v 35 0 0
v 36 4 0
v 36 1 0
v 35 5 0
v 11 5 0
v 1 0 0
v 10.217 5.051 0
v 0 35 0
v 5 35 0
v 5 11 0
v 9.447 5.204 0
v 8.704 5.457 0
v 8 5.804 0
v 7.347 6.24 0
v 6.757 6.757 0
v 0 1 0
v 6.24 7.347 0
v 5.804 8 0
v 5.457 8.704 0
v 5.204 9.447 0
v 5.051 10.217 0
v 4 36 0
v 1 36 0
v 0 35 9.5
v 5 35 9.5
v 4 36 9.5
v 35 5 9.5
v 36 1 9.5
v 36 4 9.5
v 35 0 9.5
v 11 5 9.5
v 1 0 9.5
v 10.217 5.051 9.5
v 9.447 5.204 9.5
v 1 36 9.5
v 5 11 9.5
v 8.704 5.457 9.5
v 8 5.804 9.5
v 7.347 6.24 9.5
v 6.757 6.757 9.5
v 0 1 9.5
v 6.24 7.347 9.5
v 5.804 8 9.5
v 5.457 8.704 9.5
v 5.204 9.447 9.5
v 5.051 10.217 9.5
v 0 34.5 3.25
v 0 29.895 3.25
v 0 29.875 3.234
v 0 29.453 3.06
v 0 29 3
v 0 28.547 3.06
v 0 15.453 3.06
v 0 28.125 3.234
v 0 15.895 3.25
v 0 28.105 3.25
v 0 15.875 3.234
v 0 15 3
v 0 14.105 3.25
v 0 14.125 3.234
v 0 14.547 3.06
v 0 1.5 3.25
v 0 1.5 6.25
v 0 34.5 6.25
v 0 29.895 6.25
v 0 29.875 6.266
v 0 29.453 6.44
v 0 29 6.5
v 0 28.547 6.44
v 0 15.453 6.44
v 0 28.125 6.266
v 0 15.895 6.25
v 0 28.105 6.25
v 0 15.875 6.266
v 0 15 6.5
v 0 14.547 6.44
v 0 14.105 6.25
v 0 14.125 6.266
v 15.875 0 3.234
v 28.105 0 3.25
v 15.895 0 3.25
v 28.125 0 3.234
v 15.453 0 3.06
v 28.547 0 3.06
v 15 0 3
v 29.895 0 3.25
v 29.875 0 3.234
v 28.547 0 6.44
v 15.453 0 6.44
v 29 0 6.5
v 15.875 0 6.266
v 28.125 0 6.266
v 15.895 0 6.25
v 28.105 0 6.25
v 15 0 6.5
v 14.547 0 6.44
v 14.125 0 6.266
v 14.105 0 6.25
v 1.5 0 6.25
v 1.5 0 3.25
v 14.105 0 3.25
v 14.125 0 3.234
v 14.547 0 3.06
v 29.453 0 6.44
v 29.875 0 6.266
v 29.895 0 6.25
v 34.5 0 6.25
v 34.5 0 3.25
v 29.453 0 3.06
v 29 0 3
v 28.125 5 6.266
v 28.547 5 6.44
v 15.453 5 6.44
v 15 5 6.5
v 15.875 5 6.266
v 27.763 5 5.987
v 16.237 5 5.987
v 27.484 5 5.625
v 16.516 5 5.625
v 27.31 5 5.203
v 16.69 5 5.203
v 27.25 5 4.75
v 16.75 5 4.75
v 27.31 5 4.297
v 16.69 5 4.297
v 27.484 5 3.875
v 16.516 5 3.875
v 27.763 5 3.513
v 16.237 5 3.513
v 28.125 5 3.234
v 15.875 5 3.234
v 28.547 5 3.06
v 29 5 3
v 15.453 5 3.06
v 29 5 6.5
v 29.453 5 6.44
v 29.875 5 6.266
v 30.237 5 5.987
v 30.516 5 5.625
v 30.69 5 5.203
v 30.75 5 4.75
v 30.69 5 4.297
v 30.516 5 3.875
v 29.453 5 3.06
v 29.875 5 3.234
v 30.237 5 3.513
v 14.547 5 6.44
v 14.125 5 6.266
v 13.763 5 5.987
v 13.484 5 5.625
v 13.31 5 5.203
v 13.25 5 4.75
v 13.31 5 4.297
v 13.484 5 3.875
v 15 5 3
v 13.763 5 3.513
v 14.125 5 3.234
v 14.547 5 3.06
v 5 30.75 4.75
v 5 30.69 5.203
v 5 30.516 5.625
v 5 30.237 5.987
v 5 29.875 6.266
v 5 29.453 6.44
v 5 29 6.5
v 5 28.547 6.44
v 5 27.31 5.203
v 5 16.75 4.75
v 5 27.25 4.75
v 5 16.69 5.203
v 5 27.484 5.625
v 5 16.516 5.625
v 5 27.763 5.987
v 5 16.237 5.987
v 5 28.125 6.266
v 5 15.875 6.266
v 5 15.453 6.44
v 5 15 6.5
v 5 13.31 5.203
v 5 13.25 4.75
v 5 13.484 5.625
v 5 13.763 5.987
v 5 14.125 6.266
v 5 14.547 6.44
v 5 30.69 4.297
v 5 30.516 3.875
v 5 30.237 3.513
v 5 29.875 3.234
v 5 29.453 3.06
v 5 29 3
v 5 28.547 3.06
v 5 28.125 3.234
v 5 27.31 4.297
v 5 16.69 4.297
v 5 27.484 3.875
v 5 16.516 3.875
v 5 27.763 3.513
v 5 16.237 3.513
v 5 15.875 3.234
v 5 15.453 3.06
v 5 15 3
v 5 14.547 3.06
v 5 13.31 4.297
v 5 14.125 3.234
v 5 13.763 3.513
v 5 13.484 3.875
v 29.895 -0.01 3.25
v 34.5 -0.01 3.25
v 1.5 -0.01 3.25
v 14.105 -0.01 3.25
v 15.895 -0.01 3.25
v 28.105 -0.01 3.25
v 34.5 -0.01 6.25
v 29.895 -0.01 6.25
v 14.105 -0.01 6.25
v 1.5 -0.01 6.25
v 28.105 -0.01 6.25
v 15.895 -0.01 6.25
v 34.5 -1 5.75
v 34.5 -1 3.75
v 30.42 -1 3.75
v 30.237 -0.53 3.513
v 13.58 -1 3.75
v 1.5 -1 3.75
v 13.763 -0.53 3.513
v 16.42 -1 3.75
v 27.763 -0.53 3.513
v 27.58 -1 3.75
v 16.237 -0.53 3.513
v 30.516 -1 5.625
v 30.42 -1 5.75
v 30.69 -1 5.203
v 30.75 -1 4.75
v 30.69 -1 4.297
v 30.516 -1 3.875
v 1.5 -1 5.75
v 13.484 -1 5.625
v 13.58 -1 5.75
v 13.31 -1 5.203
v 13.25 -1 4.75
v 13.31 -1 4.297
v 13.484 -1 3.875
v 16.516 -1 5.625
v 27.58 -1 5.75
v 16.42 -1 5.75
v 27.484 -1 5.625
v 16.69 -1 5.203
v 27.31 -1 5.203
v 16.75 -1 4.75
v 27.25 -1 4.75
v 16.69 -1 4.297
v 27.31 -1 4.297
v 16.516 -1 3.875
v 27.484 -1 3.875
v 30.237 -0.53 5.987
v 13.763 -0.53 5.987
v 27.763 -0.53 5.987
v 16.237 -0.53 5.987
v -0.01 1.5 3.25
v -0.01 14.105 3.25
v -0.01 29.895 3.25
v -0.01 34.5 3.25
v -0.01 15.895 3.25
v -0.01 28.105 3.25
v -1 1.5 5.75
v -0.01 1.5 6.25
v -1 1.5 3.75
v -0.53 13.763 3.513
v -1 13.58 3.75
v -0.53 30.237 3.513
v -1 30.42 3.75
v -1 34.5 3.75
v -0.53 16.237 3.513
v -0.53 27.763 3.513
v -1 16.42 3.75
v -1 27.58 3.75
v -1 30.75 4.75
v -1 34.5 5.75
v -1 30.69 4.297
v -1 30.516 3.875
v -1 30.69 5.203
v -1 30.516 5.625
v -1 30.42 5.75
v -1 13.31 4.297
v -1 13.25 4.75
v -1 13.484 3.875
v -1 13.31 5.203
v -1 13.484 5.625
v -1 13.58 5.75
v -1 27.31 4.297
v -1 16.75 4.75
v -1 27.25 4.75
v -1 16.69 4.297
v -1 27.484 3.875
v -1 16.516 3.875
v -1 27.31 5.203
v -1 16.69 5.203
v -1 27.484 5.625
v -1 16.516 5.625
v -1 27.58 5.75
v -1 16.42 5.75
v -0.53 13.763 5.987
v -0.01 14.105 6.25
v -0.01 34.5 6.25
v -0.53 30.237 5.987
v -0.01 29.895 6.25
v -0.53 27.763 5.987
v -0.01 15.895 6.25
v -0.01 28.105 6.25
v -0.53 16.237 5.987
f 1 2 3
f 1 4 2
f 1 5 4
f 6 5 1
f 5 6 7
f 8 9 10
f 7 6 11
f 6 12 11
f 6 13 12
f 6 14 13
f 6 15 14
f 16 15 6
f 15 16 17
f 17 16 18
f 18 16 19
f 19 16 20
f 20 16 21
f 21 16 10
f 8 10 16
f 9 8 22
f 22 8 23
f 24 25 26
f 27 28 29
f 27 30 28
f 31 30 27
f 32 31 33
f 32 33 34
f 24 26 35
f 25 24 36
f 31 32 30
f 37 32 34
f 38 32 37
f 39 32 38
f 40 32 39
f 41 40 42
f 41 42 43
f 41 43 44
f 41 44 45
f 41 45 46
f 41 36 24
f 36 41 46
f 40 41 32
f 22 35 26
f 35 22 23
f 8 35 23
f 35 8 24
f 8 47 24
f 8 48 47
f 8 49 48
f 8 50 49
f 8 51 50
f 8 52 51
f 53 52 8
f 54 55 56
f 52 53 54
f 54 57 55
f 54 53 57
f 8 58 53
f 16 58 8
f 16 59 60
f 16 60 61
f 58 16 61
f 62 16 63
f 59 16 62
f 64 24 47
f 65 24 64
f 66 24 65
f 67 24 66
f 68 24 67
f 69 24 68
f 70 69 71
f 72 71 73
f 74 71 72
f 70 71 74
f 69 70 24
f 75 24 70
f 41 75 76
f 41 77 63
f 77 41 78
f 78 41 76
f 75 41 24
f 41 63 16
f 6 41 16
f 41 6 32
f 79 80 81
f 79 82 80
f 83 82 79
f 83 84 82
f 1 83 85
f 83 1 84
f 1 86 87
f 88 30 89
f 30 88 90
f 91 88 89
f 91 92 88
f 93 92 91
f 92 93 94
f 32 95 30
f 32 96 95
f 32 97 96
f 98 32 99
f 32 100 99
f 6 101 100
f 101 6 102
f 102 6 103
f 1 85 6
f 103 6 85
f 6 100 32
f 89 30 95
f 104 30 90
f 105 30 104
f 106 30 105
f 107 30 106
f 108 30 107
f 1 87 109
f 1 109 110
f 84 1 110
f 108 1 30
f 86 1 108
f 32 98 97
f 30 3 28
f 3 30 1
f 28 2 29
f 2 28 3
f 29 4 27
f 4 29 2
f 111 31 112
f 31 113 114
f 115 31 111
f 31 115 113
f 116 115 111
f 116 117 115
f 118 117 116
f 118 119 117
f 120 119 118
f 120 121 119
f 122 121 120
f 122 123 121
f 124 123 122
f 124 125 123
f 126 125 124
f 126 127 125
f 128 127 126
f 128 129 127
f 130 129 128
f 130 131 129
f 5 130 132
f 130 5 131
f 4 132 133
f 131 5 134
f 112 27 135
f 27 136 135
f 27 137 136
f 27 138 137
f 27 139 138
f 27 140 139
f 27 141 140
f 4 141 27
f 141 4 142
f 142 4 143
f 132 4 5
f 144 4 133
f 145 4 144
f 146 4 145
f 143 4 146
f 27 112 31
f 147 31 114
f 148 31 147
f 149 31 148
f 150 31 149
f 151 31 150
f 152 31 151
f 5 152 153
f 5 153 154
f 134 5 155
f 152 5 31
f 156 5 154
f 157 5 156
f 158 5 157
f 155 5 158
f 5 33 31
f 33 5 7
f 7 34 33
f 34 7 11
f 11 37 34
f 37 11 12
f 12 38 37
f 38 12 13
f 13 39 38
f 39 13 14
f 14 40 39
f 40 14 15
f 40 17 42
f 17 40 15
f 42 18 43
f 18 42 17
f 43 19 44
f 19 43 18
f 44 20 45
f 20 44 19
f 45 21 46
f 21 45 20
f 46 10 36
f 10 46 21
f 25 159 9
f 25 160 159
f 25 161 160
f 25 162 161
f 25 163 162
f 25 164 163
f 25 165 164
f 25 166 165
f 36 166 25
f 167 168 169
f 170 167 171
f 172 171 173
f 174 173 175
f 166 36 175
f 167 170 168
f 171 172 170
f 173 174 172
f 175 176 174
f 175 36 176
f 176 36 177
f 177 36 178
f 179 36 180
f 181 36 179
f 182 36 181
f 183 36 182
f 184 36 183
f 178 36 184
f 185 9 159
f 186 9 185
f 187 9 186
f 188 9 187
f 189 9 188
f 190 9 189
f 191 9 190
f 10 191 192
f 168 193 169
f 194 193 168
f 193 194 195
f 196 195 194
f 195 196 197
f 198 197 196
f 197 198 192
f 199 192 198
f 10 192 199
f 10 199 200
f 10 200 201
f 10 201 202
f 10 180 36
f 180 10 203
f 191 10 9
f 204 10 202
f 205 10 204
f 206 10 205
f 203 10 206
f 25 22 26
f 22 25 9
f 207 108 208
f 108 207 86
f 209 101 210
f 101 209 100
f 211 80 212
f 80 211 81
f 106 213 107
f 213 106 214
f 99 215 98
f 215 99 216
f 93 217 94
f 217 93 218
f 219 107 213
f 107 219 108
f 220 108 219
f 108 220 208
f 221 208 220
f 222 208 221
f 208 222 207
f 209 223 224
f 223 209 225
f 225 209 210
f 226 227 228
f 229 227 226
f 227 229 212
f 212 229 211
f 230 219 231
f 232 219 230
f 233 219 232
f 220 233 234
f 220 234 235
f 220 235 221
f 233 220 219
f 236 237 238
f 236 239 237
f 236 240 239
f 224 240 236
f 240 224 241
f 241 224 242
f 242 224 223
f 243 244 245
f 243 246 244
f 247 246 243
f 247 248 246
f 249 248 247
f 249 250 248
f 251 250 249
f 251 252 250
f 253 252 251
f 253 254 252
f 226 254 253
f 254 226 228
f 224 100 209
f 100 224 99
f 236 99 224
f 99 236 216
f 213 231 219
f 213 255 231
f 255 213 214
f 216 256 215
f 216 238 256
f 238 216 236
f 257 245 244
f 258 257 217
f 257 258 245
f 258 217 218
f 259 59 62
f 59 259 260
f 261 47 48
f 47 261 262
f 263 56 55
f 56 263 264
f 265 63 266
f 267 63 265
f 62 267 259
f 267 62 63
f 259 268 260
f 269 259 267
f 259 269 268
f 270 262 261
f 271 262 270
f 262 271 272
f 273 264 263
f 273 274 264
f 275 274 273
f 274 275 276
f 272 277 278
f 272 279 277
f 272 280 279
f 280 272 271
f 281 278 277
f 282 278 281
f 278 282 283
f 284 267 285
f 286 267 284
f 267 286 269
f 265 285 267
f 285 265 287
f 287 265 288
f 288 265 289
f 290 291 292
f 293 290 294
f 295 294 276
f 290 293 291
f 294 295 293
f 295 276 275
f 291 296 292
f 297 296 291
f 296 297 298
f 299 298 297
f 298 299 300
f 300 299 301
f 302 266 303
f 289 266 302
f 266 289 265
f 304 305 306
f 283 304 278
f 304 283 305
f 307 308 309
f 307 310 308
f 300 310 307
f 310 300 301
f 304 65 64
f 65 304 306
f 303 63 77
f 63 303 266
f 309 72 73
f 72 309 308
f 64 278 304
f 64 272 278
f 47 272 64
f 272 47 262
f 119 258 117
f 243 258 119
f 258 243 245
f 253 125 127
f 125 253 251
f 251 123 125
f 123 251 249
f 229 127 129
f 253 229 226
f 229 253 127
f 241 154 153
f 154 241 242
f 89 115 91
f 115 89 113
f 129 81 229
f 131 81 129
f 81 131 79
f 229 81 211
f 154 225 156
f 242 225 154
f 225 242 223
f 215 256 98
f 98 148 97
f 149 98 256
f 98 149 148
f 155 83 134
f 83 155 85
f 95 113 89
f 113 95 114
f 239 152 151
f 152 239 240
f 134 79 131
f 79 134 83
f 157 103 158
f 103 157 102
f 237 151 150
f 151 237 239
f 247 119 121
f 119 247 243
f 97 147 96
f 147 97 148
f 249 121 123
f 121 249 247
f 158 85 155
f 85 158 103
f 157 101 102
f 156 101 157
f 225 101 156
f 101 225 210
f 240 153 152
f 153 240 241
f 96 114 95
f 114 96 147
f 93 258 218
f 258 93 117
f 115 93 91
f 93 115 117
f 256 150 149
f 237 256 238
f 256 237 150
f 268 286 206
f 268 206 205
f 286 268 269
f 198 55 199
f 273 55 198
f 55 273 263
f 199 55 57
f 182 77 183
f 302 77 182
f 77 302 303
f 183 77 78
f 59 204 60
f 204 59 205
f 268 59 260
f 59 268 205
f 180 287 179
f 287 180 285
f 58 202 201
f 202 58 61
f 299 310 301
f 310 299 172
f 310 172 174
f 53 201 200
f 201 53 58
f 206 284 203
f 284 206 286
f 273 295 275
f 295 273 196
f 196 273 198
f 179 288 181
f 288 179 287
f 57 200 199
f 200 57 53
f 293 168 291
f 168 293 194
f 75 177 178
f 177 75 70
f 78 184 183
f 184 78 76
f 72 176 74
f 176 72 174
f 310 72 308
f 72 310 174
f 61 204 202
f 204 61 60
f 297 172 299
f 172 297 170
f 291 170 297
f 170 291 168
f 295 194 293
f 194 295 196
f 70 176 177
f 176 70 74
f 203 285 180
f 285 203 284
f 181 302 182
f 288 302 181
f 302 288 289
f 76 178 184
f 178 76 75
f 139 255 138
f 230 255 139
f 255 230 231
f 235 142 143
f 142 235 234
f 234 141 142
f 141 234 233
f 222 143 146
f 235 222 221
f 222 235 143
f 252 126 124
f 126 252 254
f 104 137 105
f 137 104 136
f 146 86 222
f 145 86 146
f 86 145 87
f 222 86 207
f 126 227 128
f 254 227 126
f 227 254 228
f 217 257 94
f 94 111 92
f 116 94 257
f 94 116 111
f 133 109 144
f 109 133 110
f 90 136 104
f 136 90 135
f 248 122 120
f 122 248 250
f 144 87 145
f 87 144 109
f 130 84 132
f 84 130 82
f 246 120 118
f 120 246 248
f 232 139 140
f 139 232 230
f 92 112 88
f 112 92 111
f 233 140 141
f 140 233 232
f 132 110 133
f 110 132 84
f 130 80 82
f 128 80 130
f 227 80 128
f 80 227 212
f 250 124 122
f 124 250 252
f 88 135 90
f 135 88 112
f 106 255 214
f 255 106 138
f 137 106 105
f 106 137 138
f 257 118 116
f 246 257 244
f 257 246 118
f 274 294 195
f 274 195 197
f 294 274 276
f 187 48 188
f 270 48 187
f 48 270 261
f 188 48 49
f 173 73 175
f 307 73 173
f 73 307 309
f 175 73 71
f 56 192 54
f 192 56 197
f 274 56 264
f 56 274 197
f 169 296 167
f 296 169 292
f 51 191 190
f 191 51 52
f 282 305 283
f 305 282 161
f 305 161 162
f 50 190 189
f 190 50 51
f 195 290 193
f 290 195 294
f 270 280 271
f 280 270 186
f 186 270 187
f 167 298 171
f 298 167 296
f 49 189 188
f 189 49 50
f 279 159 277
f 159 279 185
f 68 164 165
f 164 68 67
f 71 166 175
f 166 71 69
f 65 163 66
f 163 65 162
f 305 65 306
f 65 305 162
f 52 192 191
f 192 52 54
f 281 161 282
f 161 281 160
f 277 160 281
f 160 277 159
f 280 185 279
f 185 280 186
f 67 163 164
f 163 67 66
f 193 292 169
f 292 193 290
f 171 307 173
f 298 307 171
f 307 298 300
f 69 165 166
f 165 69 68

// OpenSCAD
// 2026-10-31: inside corner bracket for the dry box's 1010 front frame. A 90 degree angle
// in each inside corner of the door opening: one leg on the horizontal member's inner face,
// one on the vertical's inner face, 2 M3 x 8 screws per leg into T-nuts in those slots
// (the outer slots carry the panel screws, the front face carries the foam seal).
// Symmetric, so all 4 corners take the same part. The bracket is 0.5 mm narrower than the
// extrusion depth: set it flush with the back face so it stays clear of the door and seal.
// Print on its side (the L profile on the bed): layers then run around the corner, and the
// screw holes print horizontal (small, they bridge fine). PLA, 0.2 mm, 4 walls, 40 %.
// Profile axes: x along the horizontal leg, y along the vertical leg, z across the
// extrusion depth. Units mm.

ext     = 10;      // 1010 extrusion width and depth
plate_t = 5.0;     // M3 x 8 reaches 8 - 5.0 = 3.0 past the face = tnut_tip in panels.scad
leg     = 36;      // leg length from the corner
w       = ext - 0.5;
screw_d = 3.5;     // M3 clearance
screw   = [15, 29];    // hole positions from the corner, both legs
fillet  = 6;       // inside fillet, kept clear of the nearest screw head (M3 head d 5.5)
edge_r  = 1;       // rounding on the leg ends and the outer corner
// alignment key: a rib down each leg's mounting face that drops into the slot opening
// (3.3 mm) and keeps the bracket centered and square. Tapered 3.0 -> 2.0 mm so it
// starts easily and its sideways overhang prints without support.
key_h   = 1.0;
key_w   = [3.0, 2.0];  // at the face, at the tip
key_end = 1.5;         // stop short of the leg end and of the rounded outer corner

module profile() {
    offset(r = edge_r) offset(delta = -edge_r) union() {
        square([leg, plate_t]);
        square([plate_t, leg]);
    }
    translate([plate_t, plate_t]) difference() {
        square(fillet);
        translate([fillet, fillet]) circle(r = fillet, $fn = 48);
    }
}

// key along x on the y = 0 face, protruding toward -y
module key() {
    hull() {
        translate([key_end, -0.01, (w - key_w[0]) / 2]) cube([leg - 2 * key_end, 0.01, key_w[0]]);
        translate([key_end, -key_h, (w - key_w[1]) / 2]) cube([leg - 2 * key_end, 0.01, key_w[1]]);
    }
}

difference() {
    union() {
        linear_extrude(w) profile();
        key();                                                 // horizontal leg
        multmatrix([[0, 1, 0, 0], [1, 0, 0, 0], [0, 0, 1, 0]]) key();   // vertical leg (x <-> y)
    }
    for (p = screw) {
        translate([p, -key_h - 1, w / 2]) rotate([-90, 0, 0]) cylinder(d = screw_d, h = plate_t + key_h + 2, $fn = 24);
        translate([-key_h - 1, p, w / 2]) rotate([0, 90, 0])  cylinder(d = screw_d, h = plate_t + key_h + 2, $fn = 24);
    }
}

echo(str("inside bracket ", leg, " x ", leg, " x ", w, " mm, plate ", plate_t,
         "; screws at ", screw, "; head clearance from fillet ",
         screw[0] - 5.5 / 2 - (plate_t + fillet), " mm"));
